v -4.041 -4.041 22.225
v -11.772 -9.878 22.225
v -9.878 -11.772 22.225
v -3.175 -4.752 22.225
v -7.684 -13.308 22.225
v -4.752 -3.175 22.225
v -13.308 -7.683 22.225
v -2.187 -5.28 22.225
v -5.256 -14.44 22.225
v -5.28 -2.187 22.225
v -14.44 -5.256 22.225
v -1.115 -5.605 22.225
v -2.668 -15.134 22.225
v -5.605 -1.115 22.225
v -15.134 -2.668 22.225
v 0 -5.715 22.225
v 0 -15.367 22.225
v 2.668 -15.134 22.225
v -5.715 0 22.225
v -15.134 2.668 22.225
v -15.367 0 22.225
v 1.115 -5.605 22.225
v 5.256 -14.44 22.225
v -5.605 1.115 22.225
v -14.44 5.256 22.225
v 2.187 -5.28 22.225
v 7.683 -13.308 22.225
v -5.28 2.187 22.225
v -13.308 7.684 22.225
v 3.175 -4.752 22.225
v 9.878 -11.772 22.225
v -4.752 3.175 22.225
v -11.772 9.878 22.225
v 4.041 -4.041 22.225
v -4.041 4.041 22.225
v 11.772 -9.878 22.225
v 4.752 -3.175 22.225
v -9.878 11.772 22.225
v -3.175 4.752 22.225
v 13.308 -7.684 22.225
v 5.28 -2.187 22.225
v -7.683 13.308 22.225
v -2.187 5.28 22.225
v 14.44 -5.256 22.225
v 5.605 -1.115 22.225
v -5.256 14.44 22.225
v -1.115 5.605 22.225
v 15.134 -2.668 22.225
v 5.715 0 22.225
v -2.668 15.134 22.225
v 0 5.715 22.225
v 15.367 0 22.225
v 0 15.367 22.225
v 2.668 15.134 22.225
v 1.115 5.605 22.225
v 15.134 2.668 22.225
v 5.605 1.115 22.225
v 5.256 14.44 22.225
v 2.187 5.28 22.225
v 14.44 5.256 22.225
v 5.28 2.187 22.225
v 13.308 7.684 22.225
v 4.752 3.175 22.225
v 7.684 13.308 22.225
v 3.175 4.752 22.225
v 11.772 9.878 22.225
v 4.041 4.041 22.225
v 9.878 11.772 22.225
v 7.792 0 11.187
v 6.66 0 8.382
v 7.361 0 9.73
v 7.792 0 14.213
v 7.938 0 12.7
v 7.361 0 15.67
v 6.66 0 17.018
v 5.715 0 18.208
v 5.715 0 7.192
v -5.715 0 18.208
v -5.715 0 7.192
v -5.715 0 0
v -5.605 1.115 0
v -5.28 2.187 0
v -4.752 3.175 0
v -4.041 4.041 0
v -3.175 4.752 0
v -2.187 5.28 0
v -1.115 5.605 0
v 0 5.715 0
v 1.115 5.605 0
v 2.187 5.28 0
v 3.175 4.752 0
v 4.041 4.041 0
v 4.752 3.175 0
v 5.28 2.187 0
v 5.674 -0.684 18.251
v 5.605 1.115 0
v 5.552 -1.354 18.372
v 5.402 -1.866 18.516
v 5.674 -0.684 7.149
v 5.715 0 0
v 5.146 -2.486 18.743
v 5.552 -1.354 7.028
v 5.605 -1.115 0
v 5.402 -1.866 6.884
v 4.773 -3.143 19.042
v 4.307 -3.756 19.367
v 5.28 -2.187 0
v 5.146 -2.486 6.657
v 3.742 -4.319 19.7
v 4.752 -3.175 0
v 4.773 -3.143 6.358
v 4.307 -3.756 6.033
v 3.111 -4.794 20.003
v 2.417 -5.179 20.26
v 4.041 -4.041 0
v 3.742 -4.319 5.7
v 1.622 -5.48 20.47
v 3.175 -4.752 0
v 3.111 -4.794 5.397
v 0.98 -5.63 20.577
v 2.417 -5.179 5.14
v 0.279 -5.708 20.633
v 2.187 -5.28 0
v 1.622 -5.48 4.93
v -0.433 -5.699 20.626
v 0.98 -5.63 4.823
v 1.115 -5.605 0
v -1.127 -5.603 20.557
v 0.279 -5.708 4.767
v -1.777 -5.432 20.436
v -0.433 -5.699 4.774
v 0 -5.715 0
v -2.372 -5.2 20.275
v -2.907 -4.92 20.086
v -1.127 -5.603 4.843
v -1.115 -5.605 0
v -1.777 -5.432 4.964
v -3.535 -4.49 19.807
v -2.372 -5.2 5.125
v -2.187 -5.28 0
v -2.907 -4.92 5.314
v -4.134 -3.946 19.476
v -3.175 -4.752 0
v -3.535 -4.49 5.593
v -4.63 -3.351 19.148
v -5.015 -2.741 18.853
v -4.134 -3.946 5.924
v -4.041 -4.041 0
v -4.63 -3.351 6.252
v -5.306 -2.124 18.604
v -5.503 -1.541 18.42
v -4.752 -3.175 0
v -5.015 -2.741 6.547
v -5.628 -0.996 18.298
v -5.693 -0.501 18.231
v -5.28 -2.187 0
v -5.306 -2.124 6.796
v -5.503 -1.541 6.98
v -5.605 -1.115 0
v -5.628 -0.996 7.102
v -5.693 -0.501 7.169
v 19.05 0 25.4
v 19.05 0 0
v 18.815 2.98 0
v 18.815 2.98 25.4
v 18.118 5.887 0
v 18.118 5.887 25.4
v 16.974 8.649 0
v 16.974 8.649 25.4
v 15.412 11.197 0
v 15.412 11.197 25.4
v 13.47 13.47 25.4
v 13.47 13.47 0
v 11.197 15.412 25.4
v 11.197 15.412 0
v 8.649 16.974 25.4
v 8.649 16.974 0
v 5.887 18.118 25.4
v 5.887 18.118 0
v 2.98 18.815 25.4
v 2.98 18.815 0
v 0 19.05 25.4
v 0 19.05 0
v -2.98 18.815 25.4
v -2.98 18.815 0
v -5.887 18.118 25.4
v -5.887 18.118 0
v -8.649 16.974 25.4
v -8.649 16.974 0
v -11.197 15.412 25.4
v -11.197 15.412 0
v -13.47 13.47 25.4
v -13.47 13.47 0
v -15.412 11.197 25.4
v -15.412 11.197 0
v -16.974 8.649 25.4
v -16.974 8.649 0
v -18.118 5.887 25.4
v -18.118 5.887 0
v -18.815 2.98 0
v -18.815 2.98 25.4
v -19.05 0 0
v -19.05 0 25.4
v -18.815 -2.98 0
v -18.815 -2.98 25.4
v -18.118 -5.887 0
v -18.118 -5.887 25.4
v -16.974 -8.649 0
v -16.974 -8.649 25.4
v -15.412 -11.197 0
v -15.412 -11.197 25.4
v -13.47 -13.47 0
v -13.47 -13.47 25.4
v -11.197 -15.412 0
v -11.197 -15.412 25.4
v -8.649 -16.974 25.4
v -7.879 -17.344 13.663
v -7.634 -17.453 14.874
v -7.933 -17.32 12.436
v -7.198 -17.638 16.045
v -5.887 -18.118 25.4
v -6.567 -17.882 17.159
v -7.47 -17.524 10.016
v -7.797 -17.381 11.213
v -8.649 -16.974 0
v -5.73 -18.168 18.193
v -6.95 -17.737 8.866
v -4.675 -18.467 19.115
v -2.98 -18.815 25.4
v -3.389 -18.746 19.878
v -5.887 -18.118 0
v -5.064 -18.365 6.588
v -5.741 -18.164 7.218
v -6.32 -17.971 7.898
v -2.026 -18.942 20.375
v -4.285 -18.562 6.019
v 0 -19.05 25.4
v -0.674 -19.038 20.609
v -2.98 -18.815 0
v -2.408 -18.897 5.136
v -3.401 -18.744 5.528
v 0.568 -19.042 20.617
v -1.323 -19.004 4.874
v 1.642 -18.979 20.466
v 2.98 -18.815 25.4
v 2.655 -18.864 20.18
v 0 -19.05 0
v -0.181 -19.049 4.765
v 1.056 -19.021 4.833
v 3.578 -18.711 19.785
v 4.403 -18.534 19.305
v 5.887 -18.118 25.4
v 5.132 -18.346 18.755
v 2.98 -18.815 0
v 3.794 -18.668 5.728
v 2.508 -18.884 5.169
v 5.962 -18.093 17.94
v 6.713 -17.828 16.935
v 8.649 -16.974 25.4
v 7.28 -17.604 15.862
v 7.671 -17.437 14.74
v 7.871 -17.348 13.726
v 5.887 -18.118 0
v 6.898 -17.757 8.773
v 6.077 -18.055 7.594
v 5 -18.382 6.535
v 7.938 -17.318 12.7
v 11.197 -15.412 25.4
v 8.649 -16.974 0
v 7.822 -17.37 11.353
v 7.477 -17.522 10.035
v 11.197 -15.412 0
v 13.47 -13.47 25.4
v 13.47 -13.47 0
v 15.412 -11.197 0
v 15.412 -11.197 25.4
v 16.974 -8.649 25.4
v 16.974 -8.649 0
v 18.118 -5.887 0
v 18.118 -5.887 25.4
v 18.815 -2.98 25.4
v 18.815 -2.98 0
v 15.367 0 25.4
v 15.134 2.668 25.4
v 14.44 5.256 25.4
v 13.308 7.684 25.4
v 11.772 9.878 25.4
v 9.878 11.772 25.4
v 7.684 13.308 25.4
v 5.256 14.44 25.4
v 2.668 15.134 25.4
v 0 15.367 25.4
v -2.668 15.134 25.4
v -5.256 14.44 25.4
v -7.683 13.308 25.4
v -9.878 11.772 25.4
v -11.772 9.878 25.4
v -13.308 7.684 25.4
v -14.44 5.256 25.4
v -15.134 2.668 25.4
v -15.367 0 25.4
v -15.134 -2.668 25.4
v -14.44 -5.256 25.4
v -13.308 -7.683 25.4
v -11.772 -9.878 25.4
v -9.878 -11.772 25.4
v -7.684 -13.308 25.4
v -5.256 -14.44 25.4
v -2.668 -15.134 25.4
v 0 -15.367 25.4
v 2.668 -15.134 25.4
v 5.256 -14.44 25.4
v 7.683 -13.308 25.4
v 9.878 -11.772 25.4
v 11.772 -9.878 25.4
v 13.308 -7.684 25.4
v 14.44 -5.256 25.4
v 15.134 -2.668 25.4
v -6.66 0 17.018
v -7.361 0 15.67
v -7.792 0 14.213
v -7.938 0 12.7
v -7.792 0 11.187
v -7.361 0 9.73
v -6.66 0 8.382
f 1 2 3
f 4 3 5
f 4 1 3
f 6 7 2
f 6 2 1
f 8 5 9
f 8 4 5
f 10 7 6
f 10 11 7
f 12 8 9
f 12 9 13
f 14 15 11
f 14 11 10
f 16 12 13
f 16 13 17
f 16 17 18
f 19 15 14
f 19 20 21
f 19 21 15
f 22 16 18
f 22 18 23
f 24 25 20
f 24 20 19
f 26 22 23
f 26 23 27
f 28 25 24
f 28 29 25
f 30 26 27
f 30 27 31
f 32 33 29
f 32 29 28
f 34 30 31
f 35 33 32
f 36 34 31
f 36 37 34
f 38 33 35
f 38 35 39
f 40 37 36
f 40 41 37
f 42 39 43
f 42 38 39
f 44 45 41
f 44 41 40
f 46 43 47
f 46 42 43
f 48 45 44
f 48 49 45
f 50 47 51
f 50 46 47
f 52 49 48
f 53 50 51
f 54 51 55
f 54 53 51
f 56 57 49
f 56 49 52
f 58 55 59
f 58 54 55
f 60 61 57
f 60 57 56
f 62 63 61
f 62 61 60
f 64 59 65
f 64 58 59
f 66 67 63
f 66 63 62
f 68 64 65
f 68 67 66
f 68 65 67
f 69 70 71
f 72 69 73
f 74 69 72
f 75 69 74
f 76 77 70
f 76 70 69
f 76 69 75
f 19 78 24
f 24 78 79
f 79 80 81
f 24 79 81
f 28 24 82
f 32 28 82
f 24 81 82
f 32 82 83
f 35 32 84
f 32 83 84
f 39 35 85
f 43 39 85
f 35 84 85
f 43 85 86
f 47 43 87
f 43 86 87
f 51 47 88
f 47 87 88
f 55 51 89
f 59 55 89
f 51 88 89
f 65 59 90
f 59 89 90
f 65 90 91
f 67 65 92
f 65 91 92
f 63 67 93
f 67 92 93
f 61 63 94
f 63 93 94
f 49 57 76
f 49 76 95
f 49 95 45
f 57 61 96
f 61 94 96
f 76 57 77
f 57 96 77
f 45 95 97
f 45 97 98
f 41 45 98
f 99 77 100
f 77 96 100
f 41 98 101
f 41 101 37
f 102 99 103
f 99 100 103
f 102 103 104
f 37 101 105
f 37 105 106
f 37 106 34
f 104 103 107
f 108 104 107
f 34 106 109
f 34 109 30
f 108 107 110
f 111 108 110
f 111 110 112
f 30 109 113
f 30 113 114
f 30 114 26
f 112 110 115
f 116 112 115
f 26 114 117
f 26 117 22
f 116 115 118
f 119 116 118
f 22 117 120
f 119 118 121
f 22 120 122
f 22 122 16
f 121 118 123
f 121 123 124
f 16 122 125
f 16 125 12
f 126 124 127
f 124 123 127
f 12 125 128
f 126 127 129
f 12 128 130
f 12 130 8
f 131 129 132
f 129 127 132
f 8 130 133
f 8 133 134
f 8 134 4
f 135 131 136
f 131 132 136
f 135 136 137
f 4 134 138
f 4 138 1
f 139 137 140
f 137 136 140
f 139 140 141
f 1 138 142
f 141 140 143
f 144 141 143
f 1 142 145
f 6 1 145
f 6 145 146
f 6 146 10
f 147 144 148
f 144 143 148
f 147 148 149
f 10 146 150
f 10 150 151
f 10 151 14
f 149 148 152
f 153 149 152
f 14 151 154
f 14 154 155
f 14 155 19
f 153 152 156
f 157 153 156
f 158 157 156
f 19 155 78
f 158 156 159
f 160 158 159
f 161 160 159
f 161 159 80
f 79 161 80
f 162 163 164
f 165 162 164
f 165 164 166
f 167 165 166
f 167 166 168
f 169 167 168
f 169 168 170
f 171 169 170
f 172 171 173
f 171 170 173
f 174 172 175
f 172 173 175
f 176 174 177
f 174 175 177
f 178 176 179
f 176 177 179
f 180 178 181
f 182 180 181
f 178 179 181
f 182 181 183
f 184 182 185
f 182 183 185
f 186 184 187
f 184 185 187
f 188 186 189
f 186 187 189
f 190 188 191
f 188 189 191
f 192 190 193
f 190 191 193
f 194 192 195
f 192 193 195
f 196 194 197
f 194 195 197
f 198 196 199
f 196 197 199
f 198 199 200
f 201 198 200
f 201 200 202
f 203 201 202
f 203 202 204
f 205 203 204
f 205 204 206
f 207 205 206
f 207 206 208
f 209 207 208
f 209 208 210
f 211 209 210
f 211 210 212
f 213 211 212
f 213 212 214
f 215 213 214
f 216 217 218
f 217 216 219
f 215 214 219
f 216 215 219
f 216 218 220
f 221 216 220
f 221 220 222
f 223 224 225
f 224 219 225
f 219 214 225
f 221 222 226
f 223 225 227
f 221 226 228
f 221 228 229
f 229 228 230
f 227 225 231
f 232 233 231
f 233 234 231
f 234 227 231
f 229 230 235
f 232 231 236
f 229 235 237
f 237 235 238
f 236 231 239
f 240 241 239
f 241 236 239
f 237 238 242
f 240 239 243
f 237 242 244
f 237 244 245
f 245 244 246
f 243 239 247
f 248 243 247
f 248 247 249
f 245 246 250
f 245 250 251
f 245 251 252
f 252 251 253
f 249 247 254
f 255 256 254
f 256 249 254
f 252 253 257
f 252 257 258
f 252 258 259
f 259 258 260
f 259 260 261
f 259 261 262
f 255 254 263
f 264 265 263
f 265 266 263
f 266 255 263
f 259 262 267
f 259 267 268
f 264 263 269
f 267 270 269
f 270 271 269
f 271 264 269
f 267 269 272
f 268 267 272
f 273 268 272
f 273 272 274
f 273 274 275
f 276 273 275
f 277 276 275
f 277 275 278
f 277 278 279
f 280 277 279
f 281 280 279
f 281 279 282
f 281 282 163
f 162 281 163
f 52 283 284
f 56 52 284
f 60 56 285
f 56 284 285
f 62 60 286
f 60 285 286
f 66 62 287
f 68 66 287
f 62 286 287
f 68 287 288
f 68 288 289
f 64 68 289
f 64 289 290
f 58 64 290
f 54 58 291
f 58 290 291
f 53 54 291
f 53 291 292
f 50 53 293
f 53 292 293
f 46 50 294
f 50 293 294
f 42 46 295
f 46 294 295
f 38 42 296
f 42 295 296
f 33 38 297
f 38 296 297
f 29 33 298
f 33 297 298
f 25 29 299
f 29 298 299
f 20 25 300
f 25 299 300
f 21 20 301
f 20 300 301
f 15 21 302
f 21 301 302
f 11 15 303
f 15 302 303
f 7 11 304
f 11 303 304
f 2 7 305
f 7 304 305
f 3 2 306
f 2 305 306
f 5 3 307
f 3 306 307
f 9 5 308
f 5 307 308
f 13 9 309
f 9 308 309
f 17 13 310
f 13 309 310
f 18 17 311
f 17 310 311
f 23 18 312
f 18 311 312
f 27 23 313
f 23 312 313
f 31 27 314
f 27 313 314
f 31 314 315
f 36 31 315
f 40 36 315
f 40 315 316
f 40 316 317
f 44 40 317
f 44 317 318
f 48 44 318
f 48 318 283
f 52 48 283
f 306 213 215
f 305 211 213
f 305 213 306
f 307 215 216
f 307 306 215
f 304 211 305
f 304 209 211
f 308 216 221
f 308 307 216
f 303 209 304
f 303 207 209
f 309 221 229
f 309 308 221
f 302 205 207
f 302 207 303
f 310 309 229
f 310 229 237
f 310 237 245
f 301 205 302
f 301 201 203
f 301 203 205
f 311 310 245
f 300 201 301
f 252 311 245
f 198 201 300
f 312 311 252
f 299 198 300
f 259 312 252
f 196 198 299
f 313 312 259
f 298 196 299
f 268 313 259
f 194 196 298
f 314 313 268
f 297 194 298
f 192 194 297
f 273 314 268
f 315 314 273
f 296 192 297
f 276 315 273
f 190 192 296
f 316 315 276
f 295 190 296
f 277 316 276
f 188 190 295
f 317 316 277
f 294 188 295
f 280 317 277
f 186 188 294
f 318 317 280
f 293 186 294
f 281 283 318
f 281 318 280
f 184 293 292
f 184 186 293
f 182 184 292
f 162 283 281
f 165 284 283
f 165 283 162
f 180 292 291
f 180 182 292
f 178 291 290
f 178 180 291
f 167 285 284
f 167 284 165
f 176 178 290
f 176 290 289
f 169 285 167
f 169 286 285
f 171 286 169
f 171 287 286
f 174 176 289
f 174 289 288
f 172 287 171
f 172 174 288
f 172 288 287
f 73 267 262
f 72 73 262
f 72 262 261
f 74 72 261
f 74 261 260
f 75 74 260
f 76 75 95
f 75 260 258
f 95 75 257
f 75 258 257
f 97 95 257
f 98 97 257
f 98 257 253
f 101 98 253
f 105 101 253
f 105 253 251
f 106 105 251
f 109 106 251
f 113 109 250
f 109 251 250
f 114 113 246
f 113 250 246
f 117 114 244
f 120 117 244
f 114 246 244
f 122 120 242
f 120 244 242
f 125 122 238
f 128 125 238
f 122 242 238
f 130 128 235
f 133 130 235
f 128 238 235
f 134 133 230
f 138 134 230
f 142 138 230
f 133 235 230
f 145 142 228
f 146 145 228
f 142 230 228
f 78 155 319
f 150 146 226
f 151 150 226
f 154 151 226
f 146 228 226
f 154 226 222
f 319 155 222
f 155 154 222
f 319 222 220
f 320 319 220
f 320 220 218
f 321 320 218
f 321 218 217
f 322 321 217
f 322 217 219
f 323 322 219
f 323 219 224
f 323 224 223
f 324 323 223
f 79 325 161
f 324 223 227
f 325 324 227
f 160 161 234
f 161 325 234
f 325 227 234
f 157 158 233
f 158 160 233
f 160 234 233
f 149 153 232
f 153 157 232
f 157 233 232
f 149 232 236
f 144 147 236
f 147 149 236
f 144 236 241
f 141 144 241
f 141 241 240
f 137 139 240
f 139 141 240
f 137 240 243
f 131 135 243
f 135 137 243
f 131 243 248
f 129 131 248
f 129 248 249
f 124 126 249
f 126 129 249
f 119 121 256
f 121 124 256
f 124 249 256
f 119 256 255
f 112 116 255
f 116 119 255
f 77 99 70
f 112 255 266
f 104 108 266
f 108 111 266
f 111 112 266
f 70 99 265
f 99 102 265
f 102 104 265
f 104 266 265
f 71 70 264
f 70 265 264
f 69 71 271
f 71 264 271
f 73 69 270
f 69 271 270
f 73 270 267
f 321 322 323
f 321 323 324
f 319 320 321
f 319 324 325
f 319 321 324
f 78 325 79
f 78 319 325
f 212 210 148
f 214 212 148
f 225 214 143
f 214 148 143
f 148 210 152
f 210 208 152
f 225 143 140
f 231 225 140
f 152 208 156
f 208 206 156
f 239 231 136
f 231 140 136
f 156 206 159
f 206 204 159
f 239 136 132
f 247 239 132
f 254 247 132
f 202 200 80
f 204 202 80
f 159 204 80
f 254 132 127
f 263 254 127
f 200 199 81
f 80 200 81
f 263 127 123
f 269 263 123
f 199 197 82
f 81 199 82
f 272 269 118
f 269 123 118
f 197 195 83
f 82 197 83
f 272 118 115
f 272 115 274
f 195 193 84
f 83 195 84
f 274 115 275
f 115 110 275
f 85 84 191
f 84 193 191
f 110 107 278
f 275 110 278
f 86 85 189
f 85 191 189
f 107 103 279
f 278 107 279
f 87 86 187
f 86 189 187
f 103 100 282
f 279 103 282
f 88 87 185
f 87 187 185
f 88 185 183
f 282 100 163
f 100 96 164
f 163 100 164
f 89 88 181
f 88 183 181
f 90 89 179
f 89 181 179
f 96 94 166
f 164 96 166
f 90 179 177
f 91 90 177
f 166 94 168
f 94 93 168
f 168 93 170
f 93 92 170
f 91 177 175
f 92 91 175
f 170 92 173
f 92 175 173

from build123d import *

# Parameters (mm, degrees)
F0_R     = 19.05
F1_DEPTH = 25.4
F3_D     = 11.43
F4_R     = 15.367
F5_DEPTH = 3.175
F7_R     = 7.9375
F8_DEPTH = 19.05


with BuildPart() as f1:
    # F0 (on Top) → F1 (new body)
    with BuildSketch(Plane.XY):
        Circle(F0_R)
    extrude(amount=F1_DEPTH)

    # F3 (through all)
    with Locations(Plane.XY.offset(25.4)):
        with Locations((0, 0)):
            Hole(F3_D / 2)

    # F4 (on face) → F5 (cut)
    with BuildSketch(Plane.XY.offset(25.4)):
        Circle(F4_R)
    extrude(amount=-F5_DEPTH, mode=Mode.SUBTRACT)

    # F7 (on offset) → F8 (cut)
    with BuildSketch(Plane.XZ.offset(19.05)):
        with Locations((0, 12.7)):
            Circle(F7_R)
    extrude(amount=-F8_DEPTH, mode=Mode.SUBTRACT)


solid = f1.part
